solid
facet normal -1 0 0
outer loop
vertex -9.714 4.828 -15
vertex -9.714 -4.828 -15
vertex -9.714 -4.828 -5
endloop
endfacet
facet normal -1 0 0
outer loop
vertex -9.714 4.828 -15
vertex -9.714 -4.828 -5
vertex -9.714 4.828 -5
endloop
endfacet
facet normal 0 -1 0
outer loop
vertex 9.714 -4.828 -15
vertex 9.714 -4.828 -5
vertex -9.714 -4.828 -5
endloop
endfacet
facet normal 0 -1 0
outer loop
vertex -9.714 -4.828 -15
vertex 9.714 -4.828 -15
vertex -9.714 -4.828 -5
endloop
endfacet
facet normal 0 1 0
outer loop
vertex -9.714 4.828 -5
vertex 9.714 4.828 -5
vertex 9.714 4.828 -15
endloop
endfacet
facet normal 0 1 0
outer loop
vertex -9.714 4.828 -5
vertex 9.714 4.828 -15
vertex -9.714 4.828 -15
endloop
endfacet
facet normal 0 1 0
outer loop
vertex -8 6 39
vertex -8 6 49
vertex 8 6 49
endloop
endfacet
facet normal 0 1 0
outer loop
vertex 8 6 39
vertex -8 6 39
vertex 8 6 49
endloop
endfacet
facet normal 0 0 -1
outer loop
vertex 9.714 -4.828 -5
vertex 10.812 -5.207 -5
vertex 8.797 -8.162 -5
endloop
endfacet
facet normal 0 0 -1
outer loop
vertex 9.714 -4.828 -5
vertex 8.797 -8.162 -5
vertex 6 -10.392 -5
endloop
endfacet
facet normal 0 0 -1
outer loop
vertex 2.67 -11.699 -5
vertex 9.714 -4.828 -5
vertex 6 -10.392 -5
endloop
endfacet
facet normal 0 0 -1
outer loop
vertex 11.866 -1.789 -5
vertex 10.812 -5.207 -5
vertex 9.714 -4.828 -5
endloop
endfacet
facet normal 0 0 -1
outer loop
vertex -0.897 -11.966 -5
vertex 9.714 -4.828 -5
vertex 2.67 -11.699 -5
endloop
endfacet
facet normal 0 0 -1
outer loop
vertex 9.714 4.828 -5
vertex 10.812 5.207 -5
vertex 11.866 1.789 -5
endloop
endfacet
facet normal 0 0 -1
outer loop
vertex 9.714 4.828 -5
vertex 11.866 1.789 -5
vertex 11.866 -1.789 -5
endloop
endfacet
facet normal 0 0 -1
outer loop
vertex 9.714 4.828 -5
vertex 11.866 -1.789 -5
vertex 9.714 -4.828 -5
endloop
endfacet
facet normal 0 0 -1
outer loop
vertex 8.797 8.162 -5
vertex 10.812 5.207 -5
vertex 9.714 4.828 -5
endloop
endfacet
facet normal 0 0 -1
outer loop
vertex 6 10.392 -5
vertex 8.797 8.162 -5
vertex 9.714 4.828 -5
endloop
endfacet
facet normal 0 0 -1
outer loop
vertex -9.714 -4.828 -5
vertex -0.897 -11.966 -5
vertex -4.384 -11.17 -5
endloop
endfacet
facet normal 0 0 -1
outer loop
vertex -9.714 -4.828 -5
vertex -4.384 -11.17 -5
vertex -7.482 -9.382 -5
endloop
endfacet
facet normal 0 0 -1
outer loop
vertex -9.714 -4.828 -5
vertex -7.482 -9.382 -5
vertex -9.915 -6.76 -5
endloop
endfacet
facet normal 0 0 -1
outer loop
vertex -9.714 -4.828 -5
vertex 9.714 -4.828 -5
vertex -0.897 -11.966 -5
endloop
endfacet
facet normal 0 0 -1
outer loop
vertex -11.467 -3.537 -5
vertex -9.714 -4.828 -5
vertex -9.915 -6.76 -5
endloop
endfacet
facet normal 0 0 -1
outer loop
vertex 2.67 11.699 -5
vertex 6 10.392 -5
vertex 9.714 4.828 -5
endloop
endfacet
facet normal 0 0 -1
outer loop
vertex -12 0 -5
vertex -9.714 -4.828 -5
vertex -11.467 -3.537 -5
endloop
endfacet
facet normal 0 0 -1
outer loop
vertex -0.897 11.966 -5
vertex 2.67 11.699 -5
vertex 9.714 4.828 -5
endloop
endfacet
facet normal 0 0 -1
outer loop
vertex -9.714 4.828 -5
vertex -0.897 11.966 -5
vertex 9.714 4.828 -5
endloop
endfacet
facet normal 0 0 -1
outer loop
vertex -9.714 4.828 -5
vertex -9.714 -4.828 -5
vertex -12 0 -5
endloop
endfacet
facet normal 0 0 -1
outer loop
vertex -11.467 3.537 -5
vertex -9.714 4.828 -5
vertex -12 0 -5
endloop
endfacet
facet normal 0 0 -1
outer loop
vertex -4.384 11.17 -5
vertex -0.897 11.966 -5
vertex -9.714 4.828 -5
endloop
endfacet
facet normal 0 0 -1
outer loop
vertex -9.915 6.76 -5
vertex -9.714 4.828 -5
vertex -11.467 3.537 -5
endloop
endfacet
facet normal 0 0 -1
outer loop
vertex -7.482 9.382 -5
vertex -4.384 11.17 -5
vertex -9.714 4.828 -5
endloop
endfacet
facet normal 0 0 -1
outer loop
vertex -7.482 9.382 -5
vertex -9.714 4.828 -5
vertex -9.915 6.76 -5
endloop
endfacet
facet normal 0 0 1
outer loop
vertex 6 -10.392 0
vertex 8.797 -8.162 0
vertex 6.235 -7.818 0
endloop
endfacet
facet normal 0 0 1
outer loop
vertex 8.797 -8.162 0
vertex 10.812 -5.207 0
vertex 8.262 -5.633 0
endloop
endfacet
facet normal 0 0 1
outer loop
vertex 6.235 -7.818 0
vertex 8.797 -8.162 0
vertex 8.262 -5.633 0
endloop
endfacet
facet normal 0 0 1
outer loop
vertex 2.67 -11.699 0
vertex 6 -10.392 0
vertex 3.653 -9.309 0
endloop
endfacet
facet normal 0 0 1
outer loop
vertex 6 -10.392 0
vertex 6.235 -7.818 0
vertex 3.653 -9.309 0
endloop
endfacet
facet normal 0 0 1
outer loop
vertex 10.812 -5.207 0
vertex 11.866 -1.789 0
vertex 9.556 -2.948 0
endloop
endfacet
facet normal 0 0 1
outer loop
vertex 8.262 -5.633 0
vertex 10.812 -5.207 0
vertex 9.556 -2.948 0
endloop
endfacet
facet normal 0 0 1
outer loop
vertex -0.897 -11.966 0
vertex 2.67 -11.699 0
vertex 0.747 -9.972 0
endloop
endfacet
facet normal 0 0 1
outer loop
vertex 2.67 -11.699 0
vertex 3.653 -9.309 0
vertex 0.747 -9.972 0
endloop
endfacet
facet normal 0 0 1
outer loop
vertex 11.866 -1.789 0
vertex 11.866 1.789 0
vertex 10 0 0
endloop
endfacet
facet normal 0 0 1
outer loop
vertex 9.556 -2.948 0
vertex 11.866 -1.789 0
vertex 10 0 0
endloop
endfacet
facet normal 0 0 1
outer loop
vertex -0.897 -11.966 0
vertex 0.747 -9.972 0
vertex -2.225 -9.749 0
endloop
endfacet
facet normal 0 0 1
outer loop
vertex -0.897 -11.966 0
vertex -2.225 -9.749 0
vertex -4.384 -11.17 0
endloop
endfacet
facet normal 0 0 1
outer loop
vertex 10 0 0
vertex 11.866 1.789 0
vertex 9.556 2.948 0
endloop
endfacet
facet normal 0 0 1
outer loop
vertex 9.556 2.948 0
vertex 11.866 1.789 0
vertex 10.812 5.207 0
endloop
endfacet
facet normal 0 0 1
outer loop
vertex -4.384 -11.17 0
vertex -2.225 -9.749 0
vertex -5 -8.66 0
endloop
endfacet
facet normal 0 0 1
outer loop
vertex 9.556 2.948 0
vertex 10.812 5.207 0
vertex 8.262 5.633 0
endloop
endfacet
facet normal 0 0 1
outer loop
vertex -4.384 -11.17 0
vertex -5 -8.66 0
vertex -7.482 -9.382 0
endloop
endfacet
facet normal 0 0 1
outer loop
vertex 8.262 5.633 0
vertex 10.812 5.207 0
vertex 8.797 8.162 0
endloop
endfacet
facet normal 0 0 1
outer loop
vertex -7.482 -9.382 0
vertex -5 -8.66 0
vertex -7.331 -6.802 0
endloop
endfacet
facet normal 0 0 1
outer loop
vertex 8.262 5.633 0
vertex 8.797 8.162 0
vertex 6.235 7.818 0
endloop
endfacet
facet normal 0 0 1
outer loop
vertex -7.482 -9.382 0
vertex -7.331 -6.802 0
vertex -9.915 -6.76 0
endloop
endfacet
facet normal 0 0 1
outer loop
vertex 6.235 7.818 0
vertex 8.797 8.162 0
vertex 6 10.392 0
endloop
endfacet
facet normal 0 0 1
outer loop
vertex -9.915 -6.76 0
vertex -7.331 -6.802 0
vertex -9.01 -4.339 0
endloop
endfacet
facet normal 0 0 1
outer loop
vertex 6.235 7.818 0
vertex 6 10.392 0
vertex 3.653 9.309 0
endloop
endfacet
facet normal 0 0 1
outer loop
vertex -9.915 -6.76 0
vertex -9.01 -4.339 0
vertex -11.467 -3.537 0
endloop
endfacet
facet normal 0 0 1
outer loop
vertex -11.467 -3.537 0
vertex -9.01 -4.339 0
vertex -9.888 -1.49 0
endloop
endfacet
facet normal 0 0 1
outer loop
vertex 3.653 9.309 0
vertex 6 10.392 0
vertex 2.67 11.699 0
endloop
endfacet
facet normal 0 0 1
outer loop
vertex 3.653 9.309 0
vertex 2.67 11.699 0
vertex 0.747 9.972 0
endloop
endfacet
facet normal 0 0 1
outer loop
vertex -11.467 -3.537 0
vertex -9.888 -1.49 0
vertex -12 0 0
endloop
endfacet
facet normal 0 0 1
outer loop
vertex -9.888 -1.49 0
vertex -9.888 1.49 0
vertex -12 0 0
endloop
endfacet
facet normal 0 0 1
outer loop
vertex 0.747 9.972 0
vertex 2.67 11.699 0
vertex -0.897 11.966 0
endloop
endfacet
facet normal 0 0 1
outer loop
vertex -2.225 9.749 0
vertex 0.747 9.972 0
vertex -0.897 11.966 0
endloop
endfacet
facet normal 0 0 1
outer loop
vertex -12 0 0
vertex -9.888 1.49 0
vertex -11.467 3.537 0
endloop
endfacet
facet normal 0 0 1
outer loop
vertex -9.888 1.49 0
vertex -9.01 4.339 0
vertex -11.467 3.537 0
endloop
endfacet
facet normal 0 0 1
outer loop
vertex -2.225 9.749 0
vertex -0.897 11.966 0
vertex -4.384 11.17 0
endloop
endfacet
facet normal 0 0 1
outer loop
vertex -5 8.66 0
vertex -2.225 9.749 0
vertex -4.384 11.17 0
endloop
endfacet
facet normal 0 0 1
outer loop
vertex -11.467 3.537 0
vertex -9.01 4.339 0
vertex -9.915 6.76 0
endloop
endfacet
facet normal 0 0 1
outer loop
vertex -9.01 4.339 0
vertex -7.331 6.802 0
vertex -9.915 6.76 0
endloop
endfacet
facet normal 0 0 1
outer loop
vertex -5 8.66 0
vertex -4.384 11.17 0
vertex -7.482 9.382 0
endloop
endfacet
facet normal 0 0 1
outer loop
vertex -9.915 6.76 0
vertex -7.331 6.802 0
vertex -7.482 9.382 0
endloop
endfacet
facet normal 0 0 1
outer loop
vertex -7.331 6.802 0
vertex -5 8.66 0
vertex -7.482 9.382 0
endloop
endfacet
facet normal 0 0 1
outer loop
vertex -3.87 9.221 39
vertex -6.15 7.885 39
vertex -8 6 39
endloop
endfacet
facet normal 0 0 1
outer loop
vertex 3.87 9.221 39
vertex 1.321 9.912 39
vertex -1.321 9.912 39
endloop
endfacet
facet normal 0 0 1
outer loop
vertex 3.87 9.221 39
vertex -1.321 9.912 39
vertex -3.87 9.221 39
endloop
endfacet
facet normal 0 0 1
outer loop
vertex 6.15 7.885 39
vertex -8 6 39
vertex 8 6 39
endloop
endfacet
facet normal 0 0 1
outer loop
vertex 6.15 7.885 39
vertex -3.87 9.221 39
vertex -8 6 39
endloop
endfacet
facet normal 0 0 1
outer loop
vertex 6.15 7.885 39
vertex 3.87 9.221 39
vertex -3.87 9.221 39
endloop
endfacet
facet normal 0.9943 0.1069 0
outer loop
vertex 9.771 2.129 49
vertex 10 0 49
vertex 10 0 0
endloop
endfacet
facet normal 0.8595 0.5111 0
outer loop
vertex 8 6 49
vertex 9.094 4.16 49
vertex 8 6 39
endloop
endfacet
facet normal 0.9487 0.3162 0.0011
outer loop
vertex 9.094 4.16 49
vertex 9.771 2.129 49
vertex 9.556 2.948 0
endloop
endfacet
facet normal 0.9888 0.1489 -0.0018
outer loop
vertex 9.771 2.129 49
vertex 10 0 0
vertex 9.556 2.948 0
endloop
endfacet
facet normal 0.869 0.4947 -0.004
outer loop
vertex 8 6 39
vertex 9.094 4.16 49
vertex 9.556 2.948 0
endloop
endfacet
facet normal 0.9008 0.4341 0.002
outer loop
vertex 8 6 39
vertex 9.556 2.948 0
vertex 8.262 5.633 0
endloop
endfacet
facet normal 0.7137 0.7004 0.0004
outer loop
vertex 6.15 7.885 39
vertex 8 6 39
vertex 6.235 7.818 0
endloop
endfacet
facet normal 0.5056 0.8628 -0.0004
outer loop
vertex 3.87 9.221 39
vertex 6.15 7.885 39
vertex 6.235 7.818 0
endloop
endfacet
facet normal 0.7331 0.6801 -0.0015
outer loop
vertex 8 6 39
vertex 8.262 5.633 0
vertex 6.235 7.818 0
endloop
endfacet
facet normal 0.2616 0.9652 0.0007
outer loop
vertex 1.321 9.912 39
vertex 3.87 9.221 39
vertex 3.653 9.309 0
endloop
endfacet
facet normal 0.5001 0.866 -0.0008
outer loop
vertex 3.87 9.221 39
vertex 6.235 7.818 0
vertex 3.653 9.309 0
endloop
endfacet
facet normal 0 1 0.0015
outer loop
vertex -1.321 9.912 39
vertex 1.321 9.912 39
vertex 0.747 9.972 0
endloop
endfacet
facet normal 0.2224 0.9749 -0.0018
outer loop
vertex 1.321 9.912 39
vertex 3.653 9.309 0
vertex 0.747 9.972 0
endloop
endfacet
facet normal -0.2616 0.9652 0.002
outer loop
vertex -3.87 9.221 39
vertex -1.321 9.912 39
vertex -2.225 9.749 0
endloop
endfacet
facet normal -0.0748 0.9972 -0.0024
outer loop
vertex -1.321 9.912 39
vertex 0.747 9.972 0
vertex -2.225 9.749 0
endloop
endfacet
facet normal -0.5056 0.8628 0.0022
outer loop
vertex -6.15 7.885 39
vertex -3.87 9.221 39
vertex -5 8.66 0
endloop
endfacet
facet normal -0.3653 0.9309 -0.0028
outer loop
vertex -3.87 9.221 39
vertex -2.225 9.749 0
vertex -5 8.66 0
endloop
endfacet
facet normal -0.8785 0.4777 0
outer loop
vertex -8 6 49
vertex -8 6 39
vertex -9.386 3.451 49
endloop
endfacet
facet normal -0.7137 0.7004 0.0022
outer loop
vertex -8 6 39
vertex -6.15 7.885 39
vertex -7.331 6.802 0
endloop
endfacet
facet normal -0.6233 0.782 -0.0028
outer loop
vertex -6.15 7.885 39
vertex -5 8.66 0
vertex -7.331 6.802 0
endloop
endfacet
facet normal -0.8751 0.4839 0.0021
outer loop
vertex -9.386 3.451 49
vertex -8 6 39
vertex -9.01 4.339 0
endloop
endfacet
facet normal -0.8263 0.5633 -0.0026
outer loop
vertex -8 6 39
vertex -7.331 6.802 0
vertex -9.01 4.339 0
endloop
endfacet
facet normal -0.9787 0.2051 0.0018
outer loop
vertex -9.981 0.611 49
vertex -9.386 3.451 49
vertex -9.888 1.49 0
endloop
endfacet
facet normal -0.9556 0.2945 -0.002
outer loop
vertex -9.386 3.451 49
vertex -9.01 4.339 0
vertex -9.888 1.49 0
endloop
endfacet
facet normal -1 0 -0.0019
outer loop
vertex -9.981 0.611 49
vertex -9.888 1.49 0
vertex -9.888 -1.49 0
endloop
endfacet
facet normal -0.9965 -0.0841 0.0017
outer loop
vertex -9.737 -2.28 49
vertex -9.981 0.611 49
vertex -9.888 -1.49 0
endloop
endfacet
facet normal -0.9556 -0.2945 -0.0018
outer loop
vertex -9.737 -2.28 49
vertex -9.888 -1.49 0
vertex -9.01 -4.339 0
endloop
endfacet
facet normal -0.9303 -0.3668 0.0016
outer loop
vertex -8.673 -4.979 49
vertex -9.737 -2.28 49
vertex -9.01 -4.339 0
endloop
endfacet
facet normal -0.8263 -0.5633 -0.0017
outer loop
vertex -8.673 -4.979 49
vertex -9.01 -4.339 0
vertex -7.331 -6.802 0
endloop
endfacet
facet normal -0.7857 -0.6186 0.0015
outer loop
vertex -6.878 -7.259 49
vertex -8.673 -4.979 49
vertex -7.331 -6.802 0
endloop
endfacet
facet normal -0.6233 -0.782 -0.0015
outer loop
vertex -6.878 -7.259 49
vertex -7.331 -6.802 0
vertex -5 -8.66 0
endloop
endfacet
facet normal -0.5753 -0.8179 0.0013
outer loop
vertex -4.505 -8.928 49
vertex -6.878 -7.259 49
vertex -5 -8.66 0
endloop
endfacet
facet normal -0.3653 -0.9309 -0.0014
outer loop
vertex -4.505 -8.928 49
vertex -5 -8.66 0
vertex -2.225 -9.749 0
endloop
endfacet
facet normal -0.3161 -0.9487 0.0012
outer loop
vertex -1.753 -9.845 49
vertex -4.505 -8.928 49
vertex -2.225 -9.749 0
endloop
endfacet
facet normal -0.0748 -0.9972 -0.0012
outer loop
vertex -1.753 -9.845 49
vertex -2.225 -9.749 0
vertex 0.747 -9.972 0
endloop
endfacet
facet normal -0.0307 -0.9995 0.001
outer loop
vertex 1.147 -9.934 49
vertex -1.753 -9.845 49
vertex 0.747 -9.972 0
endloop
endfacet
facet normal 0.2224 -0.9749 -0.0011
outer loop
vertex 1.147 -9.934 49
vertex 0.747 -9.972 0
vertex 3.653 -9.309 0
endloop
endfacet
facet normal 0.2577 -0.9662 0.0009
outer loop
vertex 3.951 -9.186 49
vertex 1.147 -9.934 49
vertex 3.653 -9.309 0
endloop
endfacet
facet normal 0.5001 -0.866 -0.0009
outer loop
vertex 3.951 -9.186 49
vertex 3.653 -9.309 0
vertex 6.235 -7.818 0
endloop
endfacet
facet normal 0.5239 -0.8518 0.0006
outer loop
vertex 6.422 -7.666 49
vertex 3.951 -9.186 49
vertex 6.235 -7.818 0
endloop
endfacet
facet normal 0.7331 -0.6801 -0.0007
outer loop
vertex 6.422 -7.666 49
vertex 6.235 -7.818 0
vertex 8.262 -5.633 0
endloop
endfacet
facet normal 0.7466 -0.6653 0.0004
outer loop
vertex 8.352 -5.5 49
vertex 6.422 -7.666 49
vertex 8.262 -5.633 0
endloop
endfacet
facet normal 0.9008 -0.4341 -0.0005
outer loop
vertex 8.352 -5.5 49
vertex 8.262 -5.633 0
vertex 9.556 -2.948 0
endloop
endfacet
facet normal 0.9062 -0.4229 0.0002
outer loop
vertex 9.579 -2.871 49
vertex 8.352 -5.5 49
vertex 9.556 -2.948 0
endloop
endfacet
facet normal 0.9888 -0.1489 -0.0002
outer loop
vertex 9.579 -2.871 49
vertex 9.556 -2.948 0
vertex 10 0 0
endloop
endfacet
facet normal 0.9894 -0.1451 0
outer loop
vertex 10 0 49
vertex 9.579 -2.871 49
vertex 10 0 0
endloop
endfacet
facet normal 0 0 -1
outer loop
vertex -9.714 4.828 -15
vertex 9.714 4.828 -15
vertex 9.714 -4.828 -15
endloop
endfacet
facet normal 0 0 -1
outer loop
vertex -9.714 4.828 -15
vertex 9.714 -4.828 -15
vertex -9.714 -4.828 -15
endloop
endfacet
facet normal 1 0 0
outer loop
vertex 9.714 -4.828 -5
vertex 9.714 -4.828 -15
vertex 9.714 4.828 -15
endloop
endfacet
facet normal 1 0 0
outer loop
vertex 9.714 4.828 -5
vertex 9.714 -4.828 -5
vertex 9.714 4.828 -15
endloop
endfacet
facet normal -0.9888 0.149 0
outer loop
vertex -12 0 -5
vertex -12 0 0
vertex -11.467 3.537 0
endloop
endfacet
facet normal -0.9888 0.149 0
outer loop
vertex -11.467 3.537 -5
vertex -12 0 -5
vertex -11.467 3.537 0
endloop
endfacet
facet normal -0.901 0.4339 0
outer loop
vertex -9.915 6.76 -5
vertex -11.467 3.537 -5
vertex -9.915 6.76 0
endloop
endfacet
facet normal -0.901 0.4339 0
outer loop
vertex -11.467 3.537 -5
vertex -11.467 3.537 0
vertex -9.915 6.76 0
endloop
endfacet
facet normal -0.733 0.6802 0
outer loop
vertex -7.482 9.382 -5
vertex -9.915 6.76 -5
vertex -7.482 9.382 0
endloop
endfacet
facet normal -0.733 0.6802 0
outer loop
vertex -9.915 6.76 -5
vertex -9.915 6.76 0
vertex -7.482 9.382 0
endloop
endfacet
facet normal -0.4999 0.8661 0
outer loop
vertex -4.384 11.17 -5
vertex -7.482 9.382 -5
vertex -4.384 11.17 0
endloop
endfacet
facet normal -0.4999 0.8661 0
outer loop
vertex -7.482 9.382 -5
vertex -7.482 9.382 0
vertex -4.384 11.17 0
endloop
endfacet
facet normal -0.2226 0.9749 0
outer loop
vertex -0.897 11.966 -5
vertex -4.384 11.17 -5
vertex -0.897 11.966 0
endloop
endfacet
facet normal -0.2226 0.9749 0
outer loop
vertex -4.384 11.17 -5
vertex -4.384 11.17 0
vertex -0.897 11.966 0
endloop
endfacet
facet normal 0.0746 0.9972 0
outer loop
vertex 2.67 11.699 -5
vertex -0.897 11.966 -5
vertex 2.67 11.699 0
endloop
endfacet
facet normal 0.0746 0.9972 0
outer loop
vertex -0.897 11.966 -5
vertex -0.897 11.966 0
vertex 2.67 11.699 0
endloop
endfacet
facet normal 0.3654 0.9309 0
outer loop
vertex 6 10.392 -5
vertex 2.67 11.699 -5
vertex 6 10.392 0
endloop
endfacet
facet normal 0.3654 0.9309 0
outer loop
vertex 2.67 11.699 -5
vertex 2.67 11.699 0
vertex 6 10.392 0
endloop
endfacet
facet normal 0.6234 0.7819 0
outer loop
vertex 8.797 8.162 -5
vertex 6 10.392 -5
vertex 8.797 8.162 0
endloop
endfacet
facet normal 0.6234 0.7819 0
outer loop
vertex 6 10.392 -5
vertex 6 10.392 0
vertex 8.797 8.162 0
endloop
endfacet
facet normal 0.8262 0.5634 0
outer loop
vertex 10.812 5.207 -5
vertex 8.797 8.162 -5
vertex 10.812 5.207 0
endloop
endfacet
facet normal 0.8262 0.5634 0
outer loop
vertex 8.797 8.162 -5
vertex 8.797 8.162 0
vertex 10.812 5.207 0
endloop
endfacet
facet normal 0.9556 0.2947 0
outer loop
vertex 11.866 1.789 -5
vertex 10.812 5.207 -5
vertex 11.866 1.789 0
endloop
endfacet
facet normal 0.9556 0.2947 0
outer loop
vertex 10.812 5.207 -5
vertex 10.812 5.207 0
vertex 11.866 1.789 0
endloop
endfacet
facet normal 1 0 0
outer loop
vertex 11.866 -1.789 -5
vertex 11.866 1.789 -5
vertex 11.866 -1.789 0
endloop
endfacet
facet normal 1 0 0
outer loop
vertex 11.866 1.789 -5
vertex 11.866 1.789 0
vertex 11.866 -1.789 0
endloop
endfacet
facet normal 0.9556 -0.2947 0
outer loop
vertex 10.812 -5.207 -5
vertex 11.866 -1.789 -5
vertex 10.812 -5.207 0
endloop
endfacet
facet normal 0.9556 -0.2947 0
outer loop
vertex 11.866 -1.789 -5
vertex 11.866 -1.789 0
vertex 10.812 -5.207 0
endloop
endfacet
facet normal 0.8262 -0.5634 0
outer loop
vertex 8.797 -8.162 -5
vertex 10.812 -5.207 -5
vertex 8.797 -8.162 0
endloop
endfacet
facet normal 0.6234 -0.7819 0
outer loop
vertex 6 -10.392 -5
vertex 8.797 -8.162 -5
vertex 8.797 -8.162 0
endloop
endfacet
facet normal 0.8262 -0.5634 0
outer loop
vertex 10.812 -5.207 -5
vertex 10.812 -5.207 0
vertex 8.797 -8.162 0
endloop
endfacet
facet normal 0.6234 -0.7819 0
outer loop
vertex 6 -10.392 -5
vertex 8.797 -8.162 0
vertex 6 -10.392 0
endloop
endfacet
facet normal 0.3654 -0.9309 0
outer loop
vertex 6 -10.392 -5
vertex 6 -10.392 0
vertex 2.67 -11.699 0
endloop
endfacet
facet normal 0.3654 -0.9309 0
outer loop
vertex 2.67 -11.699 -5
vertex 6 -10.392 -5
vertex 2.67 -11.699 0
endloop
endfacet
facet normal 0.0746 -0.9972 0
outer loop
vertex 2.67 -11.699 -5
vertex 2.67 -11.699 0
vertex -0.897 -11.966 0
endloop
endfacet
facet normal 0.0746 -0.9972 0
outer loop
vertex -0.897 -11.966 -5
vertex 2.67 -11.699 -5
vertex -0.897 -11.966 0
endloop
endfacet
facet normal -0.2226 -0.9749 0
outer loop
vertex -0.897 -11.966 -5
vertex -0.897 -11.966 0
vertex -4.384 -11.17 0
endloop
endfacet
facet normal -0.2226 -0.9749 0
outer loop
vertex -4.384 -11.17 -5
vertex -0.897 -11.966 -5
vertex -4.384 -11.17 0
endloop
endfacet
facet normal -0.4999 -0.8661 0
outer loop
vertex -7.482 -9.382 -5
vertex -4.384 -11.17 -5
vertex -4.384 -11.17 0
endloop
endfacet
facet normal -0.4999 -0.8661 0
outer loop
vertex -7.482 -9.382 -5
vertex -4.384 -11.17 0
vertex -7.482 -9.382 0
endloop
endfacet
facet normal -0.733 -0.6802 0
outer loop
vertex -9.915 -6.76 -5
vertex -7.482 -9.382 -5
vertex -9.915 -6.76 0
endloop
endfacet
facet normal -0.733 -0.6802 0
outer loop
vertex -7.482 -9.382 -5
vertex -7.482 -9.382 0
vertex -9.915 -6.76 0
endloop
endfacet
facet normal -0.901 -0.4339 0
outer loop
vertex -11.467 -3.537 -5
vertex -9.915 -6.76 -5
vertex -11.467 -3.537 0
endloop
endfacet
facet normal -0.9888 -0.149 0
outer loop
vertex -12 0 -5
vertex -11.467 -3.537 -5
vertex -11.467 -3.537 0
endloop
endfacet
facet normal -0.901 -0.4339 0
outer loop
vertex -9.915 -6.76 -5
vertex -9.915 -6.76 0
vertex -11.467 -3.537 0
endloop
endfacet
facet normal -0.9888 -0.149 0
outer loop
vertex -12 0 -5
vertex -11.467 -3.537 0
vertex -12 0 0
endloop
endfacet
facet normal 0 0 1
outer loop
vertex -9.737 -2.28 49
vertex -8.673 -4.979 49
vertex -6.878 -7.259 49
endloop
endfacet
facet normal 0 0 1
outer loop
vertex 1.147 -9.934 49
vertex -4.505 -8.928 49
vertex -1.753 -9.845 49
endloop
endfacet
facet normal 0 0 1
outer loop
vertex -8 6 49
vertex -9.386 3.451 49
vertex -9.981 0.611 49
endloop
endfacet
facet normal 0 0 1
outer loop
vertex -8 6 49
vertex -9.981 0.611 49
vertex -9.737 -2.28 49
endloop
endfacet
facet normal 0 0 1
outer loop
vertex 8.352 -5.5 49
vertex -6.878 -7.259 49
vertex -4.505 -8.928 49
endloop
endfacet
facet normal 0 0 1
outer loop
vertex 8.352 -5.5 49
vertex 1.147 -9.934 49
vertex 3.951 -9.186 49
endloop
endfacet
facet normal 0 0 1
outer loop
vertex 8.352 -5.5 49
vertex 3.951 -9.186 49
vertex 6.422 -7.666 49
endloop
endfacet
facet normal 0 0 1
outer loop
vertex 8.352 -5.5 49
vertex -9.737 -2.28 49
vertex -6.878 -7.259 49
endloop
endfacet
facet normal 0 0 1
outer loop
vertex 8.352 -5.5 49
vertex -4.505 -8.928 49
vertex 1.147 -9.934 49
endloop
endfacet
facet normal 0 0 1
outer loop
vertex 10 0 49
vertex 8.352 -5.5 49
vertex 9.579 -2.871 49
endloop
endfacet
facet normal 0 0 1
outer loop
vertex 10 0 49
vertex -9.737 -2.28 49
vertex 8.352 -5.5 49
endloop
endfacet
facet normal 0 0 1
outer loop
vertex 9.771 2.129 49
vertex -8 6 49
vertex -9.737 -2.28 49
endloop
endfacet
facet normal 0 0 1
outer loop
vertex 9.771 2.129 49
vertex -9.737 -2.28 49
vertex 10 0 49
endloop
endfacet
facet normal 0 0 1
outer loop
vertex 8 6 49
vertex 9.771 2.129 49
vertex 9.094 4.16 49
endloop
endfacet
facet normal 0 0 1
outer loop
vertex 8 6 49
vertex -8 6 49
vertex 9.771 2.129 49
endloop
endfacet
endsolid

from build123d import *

# Parameters (mm, degrees)
SKETCH1_R           = 10
BOSS_EXTRUDE1_DEPTH = 49
SKETCH2_R           = 12
BOSS_EXTRUDE2_DEPTH = 5
CUT_EXTRUDE1_DEPTH  = 10
SKETCH4_W           = 19.428573608
SKETCH4_H           = 9.65531402
BOSS_EXTRUDE3_DEPTH = 10


with BuildPart() as part:
    # Sketch1 → Boss-Extrude1 (new body)
    with BuildSketch(Plane.XY):
        Circle(SKETCH1_R)
    extrude(amount=BOSS_EXTRUDE1_DEPTH)

    # Sketch2 → Boss-Extrude2 (add)
    with BuildSketch(Plane(origin=(0, 0, 0), x_dir=(-1, 0, 0), z_dir=(0, 0, -1))):
        Circle(SKETCH2_R)
    extrude(amount=BOSS_EXTRUDE2_DEPTH)

    # Sketch3 → Cut-Extrude1 (cut)
    with BuildSketch(Plane.XY.offset(49)):
        with BuildLine():
            Line((0, 6), (8, 6))
            ThreePointArc((8, 6), (0, 10), (-8, 6))
            Line((-8, 6), (0, 6))
        make_face()
    extrude(amount=-CUT_EXTRUDE1_DEPTH, mode=Mode.SUBTRACT)

    # Sketch4 → Boss-Extrude3 (add)
    with BuildSketch(Plane(origin=(0, 0, -5), x_dir=(-1, 0, 0), z_dir=(0, 0, -1))):
        Rectangle(SKETCH4_W, SKETCH4_H)
    extrude(amount=BOSS_EXTRUDE3_DEPTH)


solid = part.part
